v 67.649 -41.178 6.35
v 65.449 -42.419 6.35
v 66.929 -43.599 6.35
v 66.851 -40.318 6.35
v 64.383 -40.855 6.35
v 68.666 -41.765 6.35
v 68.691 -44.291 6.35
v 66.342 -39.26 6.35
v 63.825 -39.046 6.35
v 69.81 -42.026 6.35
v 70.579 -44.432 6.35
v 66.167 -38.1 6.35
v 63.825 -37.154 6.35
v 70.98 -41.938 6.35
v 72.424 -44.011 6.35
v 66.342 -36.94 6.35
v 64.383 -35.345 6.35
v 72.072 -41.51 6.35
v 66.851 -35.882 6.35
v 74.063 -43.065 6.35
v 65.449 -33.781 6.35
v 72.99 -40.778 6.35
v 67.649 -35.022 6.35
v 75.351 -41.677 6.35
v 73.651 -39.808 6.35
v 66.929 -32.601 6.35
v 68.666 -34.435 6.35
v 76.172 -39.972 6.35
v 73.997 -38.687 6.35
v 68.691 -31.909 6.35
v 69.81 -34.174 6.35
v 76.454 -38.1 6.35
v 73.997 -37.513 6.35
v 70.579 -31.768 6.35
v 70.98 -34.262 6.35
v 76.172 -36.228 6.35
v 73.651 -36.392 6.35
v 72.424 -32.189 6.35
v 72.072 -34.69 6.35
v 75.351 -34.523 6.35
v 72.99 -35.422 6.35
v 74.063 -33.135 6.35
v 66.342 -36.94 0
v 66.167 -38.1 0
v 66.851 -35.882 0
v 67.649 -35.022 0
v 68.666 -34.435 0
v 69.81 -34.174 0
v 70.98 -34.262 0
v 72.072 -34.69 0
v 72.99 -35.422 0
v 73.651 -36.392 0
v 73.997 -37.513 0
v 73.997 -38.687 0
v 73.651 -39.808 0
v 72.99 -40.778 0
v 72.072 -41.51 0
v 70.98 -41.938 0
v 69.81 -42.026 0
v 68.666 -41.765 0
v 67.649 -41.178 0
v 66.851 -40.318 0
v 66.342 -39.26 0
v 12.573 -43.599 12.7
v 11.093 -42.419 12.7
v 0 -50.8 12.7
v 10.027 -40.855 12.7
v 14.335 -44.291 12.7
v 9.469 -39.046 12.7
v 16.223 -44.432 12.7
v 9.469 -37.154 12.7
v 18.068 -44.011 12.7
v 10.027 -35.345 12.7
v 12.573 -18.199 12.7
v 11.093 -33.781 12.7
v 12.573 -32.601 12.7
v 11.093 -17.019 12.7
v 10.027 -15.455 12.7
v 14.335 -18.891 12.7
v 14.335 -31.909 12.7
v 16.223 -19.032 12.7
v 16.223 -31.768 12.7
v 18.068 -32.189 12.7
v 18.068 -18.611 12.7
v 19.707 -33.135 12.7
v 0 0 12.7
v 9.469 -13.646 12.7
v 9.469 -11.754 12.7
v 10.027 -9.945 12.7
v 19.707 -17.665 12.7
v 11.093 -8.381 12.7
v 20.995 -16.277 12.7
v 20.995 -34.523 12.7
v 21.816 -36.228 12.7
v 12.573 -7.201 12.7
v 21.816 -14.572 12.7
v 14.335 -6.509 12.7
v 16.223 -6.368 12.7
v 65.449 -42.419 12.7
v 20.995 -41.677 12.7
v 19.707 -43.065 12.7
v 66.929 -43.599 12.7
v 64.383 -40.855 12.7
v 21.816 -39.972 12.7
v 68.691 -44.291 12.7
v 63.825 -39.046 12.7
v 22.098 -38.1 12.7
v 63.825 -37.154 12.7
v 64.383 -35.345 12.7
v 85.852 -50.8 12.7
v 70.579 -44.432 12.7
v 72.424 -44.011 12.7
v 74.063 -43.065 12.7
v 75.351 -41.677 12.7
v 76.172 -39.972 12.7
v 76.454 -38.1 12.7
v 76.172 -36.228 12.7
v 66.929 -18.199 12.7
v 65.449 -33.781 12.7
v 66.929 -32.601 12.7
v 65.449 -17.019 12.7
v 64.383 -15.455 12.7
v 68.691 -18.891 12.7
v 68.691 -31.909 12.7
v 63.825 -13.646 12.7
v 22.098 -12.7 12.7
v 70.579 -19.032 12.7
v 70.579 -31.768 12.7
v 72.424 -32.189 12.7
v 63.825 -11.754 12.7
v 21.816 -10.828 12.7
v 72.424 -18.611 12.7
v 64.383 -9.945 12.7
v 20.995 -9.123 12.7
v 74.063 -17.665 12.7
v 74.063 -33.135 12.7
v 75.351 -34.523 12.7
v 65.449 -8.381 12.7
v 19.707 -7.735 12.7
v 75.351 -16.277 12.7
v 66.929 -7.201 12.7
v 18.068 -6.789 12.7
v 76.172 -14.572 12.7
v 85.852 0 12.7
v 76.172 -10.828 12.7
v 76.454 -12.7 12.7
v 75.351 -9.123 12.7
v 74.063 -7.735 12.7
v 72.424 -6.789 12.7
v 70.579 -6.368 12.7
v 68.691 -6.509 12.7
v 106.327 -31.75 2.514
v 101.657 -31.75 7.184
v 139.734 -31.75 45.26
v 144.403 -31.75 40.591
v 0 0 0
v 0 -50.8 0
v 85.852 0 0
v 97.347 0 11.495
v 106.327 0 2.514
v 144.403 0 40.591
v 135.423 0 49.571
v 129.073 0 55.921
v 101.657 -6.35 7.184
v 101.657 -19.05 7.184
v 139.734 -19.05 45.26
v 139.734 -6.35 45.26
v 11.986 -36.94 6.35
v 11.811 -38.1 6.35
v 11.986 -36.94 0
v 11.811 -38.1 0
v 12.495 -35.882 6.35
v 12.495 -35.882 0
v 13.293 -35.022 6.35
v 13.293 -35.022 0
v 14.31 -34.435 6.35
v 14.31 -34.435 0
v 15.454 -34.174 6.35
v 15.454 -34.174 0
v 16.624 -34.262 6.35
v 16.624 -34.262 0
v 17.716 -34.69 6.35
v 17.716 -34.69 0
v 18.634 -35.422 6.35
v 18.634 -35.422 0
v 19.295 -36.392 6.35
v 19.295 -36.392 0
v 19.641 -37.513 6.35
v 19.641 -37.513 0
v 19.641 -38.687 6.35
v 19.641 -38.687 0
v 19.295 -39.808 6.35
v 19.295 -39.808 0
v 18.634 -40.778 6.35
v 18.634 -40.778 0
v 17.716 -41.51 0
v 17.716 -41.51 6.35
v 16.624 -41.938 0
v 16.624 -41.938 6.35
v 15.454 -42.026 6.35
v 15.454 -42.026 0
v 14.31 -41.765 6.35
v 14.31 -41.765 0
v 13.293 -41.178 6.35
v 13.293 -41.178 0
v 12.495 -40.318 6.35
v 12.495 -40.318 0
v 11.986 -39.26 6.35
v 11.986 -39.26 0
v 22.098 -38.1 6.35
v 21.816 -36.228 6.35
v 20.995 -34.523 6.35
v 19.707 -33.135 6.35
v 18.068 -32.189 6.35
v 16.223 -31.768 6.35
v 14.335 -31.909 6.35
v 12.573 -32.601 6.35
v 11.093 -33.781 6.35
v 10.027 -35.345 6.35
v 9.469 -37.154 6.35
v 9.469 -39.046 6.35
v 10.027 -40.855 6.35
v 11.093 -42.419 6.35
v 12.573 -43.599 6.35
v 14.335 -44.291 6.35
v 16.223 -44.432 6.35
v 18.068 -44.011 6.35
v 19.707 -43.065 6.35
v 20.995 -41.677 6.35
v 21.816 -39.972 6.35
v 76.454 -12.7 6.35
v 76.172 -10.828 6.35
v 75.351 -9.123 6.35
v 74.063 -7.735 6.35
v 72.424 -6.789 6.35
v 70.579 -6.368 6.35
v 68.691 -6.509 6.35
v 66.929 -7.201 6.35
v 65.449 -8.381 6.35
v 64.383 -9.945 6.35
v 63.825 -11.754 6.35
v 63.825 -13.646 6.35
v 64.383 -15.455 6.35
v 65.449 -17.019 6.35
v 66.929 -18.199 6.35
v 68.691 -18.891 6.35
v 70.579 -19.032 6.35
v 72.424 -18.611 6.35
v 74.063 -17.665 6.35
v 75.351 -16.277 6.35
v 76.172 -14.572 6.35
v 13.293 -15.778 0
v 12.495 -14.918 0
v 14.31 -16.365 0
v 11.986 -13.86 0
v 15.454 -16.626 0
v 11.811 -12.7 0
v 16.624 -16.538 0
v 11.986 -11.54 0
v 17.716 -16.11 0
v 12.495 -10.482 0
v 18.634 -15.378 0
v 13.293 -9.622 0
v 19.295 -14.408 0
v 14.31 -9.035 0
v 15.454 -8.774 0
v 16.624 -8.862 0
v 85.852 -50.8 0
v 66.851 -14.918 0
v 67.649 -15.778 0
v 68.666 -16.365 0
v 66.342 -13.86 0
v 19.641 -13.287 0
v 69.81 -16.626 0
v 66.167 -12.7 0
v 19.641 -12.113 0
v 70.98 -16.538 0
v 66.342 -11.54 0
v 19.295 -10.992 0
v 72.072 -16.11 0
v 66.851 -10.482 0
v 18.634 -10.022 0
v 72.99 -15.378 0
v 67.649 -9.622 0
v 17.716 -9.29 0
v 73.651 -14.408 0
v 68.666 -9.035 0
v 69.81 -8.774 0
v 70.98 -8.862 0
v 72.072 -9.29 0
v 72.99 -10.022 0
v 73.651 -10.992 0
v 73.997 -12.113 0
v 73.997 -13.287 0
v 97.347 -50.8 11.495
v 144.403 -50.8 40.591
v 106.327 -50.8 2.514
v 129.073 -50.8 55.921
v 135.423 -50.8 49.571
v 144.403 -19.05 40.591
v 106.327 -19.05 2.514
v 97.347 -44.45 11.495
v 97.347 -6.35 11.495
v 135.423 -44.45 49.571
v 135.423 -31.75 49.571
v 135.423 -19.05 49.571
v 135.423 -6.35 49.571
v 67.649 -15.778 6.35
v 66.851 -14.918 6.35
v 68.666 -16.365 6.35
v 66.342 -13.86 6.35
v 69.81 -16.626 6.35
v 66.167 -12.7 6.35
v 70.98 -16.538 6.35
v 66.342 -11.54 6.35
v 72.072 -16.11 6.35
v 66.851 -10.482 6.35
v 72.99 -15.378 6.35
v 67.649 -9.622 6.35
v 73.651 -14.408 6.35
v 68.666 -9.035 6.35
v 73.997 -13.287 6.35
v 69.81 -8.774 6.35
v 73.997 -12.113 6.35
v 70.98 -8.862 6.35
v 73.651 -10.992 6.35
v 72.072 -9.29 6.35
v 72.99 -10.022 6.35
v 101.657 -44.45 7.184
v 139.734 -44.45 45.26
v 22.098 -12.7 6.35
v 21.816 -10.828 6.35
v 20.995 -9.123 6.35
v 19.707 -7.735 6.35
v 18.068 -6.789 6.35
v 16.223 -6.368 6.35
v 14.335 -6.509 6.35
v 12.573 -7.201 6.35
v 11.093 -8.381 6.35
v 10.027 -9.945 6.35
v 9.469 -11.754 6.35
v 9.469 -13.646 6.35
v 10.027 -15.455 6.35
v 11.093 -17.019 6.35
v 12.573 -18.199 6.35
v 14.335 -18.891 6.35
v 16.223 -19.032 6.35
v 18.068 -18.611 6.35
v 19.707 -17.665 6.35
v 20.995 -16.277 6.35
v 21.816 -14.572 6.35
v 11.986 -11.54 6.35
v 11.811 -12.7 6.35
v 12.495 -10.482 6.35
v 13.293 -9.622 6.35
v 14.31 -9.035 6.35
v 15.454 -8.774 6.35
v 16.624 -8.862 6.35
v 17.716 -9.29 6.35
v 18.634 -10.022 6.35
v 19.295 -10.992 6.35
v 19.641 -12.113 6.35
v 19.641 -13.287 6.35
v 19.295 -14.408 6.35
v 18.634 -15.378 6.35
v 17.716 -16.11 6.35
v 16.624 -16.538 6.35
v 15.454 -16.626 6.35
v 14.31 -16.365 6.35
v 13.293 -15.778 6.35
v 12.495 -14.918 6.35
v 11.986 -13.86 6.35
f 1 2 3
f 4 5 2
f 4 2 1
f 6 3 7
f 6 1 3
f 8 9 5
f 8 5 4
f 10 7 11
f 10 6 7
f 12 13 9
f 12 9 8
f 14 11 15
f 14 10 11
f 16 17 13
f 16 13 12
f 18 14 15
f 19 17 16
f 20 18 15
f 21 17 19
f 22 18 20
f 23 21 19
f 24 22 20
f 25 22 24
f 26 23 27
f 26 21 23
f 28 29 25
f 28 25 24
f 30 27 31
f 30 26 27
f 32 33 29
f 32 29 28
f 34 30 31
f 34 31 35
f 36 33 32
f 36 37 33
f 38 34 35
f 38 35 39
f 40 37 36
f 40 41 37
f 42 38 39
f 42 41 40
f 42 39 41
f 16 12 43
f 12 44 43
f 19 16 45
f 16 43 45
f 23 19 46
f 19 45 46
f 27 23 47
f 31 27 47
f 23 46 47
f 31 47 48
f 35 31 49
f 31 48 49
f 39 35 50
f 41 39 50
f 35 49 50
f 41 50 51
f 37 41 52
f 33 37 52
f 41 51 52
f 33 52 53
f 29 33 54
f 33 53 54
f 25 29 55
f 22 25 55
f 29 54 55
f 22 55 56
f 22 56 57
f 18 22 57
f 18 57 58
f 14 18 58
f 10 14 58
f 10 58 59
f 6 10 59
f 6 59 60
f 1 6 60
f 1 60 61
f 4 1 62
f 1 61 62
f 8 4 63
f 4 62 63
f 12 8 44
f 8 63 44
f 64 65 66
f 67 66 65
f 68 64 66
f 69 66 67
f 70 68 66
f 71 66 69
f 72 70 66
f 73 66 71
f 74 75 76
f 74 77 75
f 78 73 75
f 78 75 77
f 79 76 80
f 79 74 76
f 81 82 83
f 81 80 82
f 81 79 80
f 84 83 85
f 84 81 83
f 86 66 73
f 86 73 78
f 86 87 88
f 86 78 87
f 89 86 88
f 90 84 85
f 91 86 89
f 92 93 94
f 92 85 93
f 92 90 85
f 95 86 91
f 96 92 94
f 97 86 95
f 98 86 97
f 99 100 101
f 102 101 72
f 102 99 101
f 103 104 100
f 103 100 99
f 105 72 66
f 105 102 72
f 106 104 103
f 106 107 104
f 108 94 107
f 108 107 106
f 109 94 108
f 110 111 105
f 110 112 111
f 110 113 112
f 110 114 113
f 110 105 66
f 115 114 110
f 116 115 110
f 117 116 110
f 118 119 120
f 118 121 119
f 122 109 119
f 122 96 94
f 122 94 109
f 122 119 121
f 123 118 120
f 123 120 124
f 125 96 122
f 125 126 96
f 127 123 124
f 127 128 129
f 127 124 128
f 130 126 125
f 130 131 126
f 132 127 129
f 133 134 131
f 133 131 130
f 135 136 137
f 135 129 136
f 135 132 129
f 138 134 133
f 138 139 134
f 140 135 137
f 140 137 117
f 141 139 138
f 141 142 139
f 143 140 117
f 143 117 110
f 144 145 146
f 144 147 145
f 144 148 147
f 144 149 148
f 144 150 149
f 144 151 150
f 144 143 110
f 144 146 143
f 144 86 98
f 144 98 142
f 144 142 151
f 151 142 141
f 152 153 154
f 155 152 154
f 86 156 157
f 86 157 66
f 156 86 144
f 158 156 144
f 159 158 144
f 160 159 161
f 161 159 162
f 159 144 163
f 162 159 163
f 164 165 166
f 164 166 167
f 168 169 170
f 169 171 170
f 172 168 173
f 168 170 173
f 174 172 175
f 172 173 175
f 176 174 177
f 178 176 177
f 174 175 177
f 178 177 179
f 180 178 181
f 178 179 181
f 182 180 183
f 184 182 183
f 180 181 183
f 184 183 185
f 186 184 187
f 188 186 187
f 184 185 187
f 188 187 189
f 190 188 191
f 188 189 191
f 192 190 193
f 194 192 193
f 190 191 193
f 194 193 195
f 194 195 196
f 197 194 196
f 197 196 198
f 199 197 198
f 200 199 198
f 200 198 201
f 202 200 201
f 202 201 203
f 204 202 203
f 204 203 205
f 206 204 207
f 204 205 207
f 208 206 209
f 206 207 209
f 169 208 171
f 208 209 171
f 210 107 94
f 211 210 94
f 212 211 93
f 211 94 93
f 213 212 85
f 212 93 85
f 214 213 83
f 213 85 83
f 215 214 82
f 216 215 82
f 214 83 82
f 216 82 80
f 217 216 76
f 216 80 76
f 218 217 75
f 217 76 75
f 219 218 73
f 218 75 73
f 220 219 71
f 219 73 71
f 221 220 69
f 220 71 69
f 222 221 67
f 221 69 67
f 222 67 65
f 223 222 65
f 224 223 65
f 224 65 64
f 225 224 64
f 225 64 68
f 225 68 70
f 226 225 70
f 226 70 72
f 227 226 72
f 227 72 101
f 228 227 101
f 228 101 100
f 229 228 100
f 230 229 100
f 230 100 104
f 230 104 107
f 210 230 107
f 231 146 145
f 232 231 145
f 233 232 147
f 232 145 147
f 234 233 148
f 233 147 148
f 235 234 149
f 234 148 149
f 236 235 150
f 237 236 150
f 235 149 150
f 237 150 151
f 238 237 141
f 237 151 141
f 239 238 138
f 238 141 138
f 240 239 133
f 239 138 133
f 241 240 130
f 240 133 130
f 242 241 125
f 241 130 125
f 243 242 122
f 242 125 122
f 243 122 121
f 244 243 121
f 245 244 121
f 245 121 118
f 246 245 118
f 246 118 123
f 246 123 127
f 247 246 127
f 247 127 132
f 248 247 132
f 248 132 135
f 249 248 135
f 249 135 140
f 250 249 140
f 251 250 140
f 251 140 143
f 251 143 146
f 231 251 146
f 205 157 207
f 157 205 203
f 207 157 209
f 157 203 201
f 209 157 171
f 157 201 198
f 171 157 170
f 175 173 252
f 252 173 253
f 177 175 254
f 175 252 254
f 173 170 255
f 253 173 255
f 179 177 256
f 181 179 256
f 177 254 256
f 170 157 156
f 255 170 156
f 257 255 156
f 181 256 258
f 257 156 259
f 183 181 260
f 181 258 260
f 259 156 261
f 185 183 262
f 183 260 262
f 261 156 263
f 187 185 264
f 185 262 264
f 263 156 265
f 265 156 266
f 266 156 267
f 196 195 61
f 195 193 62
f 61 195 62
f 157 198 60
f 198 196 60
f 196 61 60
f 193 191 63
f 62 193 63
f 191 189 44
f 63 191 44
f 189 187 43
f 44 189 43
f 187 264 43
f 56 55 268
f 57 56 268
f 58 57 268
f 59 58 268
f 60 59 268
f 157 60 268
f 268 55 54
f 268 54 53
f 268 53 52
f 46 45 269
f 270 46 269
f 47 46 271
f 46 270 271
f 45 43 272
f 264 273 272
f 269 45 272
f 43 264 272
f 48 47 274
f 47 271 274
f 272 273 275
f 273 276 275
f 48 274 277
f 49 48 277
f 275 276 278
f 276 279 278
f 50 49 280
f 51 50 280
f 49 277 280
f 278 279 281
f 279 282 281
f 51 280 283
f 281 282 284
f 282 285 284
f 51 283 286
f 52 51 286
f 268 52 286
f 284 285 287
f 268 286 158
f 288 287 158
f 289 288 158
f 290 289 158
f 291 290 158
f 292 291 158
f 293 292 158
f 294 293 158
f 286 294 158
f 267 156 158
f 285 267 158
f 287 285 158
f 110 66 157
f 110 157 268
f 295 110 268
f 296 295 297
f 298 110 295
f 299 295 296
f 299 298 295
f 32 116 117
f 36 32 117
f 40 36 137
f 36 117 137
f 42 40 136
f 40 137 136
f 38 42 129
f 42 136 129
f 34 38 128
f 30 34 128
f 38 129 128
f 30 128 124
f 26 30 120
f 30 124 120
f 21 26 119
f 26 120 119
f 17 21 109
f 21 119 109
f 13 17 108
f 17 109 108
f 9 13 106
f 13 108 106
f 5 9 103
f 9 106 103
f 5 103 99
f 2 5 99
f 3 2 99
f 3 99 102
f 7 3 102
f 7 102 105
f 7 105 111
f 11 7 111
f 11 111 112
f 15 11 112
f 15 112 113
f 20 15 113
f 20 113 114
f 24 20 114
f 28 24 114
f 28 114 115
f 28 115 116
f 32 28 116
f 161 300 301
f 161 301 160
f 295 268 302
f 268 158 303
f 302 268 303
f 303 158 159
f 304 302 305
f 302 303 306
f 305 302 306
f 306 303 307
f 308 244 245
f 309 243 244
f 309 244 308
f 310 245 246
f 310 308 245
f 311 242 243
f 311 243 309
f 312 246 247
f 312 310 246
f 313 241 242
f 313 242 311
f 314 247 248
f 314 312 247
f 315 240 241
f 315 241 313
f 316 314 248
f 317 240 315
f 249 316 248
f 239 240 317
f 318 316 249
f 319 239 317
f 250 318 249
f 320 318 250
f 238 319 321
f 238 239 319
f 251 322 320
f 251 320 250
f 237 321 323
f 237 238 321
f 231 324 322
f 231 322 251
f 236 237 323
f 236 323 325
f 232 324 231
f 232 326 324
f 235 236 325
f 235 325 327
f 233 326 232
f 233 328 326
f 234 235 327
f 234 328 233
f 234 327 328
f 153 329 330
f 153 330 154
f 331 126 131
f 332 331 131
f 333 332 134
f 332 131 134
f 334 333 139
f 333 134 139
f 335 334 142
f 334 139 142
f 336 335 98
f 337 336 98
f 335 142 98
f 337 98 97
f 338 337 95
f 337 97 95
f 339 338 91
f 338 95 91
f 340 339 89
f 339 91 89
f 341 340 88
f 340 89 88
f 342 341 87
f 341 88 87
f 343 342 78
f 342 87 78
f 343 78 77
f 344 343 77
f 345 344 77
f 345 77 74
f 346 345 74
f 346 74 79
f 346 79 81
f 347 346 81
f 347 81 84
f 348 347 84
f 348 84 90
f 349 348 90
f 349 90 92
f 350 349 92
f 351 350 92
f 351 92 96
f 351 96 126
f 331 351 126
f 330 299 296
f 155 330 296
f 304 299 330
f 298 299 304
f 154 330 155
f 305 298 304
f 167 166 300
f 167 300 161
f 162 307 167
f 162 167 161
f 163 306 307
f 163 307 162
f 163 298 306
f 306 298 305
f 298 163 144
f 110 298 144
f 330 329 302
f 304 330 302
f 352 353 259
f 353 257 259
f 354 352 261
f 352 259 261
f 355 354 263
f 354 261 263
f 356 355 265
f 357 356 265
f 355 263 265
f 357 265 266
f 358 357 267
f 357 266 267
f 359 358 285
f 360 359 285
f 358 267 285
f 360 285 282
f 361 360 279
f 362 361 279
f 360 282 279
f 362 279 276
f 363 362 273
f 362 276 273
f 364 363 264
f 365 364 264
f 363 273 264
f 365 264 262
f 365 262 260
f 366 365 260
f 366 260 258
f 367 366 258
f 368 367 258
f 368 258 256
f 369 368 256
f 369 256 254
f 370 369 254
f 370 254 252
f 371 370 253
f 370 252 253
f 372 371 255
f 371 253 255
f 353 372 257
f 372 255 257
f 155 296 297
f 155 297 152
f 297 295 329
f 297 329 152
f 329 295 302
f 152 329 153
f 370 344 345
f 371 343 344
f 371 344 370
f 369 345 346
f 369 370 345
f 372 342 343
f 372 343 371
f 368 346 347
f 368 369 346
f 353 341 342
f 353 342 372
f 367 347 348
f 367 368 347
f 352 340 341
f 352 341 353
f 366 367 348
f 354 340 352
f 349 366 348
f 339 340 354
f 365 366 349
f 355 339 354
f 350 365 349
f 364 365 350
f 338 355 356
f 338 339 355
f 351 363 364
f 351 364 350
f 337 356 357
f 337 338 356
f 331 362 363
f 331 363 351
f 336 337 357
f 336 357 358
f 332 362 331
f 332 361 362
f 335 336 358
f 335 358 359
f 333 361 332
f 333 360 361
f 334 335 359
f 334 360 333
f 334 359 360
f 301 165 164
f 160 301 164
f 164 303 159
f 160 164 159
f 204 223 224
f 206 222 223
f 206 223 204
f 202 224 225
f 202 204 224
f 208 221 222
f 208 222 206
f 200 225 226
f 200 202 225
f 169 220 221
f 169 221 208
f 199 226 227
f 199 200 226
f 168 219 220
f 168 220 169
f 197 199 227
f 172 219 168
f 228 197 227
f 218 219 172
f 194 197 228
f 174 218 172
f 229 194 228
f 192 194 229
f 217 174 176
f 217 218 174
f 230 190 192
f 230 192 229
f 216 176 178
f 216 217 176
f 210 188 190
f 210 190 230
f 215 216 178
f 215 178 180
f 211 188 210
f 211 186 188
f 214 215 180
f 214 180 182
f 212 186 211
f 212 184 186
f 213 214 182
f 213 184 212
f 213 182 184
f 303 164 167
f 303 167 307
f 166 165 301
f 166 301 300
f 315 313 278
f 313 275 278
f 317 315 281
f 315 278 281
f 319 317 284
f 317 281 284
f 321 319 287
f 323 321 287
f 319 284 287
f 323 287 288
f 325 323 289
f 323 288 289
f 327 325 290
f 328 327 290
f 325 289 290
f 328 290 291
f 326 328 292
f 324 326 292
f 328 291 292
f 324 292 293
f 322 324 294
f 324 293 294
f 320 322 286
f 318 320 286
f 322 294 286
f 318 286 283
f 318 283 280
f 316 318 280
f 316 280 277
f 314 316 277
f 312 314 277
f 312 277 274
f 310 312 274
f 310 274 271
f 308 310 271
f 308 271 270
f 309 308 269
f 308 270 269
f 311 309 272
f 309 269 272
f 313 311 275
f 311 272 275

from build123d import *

# Parameters (mm, degrees)
F0_W           = 85.852
F0_H           = 12.7
F1_DEPTH       = 50.8
F3_D           = 7.874
F3_CBORE_D     = 12.7
F3_CBORE_DEPTH = 6.35
F4_DEPTH       = 25.4
F5_W           = 19.05
F5_H           = 53.848
F6_DEPTH       = 12.7
F7_W           = 12.7
F7_H           = 6.096
F8_DEPTH       = 53.848


with BuildPart() as f1:
    # F0 (on Front) → F1 (new body)
    with BuildSketch(Plane.XZ):
        with Locations((42.926, 6.35)):
            Rectangle(F0_W, F0_H)
        Polygon((85.852, 12.7), (85.852, 0), (135.4230137883, 49.5710137883), (129.0730137883, 55.9210137883), align=None)
    extrude(amount=F1_DEPTH)

    # F3 (through all)
    with Locations(Plane.XY.offset(12.7)):
        with Locations((15.748, -12.7), (15.748, -38.1), (70.104, -38.1), (70.104, -12.7)):
            CounterBoreHole(F3_D / 2, F3_CBORE_D / 2, F3_CBORE_DEPTH)

    # F0 (on Front) → F4 (join)
    with BuildSketch(Plane.XZ):
        Polygon((85.852, 12.7), (85.852, 0), (135.4230137883, 49.5710137883), (129.0730137883, 55.9210137883), align=None)
    extrude(amount=F4_DEPTH)

    # F5 (on face) → F6 (join)
    with BuildSketch(Plane(origin=(42.926, 0, -42.926), x_dir=(0, 1, 0), z_dir=(0.7071067812, 0, -0.7071067812))):
        with Locations((-9.525, 103.8865313784)):
            Rectangle(F5_W, F5_H)
        with Locations((-41.275, 103.8865313784)):
            Rectangle(F5_W, F5_H)
    extrude(amount=F6_DEPTH)

    # F7 (on face) → F8 (cut)
    with BuildSketch(Plane(origin=(92.4970137883, 0, 92.4970137883), x_dir=(0, 1, 0), z_dir=(0.7071067812, 0, 0.7071067812))):
        with Locations((-12.7, -63.7545313784)):
            Rectangle(F7_W, F7_H)
        with Locations((-38.1, -63.7545313784)):
            Rectangle(F7_W, F7_H)
    extrude(amount=-F8_DEPTH, mode=Mode.SUBTRACT)


solid = f1.part
